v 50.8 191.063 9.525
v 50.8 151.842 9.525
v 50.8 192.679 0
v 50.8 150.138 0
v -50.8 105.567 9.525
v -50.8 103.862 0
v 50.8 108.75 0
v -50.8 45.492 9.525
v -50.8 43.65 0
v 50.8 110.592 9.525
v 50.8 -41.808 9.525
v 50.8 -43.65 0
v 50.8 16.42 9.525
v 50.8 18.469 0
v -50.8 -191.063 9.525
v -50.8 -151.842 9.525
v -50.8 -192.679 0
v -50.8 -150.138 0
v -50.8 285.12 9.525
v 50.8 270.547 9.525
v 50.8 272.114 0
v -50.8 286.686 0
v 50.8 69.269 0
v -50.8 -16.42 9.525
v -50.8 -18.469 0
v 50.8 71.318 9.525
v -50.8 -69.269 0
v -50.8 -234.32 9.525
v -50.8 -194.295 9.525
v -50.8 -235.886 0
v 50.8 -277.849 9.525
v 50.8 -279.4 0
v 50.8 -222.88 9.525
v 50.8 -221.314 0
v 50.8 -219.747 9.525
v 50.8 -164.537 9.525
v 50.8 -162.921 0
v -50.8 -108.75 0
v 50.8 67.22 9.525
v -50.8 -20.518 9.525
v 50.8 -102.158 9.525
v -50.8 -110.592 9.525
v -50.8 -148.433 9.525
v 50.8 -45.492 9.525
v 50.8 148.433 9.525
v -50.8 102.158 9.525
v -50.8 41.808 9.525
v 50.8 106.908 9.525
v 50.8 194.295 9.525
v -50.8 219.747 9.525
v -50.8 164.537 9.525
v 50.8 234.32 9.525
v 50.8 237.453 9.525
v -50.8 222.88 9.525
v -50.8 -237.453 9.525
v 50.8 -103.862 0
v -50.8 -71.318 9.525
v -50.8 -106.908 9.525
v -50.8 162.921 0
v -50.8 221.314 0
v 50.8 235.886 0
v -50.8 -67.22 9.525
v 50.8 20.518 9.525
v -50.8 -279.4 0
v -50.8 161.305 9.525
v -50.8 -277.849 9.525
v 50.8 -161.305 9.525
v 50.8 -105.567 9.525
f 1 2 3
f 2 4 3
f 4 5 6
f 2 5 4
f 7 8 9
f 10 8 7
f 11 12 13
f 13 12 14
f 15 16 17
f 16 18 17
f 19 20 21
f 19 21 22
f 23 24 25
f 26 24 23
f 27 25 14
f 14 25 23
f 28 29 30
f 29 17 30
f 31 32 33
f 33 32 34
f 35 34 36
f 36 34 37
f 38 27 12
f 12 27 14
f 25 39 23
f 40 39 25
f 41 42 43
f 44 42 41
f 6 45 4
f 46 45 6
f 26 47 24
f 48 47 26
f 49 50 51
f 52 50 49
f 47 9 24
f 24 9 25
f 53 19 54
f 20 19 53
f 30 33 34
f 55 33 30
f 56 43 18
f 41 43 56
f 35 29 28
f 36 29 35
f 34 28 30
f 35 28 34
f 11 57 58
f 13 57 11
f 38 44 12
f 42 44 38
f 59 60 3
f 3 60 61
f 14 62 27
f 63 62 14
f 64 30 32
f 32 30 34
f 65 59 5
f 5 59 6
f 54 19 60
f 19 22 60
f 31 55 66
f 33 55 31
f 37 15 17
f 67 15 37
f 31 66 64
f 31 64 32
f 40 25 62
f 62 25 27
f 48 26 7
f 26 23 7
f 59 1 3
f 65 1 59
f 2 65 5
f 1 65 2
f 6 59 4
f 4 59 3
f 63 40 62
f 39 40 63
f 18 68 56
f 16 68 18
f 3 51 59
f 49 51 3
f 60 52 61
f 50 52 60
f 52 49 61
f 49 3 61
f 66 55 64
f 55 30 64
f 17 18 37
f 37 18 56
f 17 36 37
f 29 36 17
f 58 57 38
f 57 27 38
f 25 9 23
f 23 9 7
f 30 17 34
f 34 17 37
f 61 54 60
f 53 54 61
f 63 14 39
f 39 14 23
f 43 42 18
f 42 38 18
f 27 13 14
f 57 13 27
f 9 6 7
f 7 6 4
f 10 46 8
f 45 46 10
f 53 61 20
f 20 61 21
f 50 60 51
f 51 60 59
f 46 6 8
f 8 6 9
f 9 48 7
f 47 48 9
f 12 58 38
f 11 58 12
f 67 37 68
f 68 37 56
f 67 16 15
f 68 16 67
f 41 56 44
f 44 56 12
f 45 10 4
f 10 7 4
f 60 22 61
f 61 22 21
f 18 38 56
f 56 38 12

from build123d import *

# Parameters (mm, degrees)
F2_DEPTH    = 9.525
F3_DEPTH    = 9.525
F4_DEPTH    = 9.525
F5_DEPTH    = 9.525
F6_DEPTH    = 9.525
F7_DEPTH    = 9.525
F8_DEPTH    = 9.525
F9_DEPTH    = 9.525
F10_DEPTH   = 9.525
F11_DEPTH   = 9.525
F12_DEPTH   = 9.525
F13_SIZE2   = 1.550911
F13_SIZE    = 9.52499
F13_2_SIZE2 = 1.550911
F13_2_SIZE  = 9.52499
F14_SIZE2   = 1.550911
F14_SIZE    = 9.52499
F14_2_SIZE2 = 1.550911
F14_2_SIZE  = 9.52499
F15_SIZE2   = 1.550911
F15_SIZE    = 9.52499
F15_2_SIZE2 = 1.550911
F15_2_SIZE  = 9.52499
F16_SIZE2   = 1.550911
F16_SIZE    = 9.52499
F16_2_SIZE2 = 1.550911
F16_2_SIZE  = 9.52499
F17_SIZE2   = 1.550911
F17_SIZE    = 9.52499
F17_2_SIZE2 = 1.550911
F17_2_SIZE  = 9.52499
F18_SIZE2   = 1.550911
F18_SIZE    = 9.52499
F18_2_SIZE2 = 1.550911
F18_2_SIZE  = 9.52499
F19_SIZE2   = 1.550911
F19_SIZE    = 9.52499
F19_2_SIZE2 = 1.550911
F19_2_SIZE  = 9.52499
F20_SIZE2   = 1.550911
F20_SIZE    = 9.52499
F20_2_SIZE2 = 1.550911
F20_2_SIZE  = 9.52499
F21_SIZE2   = 1.550911
F21_SIZE    = 9.52499
F21_2_SIZE2 = 1.550911
F21_2_SIZE  = 9.52499
F22_SIZE2   = 1.550911
F22_SIZE    = 9.52499
F22_2_SIZE2 = 1.550911
F22_2_SIZE  = 9.52499
F23_SIZE2   = 1.550911
F23_SIZE    = 9.52499
F23_2_SIZE2 = 1.550911
F23_2_SIZE  = 9.52499


# Not quite as in the source:
# - a fillet or chamfer is up to 0.001 mm smaller than in the source, because OpenCascade refuses the exact size


with BuildPart() as f2:
    # F1 (on Top) → F2 (new body)
    with BuildSketch(Plane.XY):
        Polygon((-50.8, 279.4), (-50.8, 221.3135439188), (50.8, 235.8864560812), (50.8, 272.1135439188), (-50.8, 286.6864560812), align=None)
    extrude(amount=F2_DEPTH)

    # F13 (size 9.525 and 1.5509205186 in the source; OpenCascade refuses exactly that, so slightly less here)
    f13_edges = [f2.edges().sort_by_distance(p)[0] for p in [
        (0, 228.6, 9.525),
    ]]
    f13_side = f2.faces().sort_by_distance((0, 228.6, 4.7625))[0]
    chamfer(f13_edges, length=F13_SIZE, length2=F13_SIZE2, reference=f13_side)

    # F13#2 (size 9.525 and 1.5509205186 in the source; OpenCascade refuses exactly that, so slightly less here)
    f13_2_edges = [f2.edges().sort_by_distance(p)[0] for p in [
        (0, 279.4, 9.525),
    ]]
    f13_2_side = f2.faces().sort_by_distance((0, 279.4, 4.7625))[0]
    chamfer(f13_2_edges, length=F13_2_SIZE, length2=F13_2_SIZE2, reference=f13_2_side)


with BuildPart() as f3:
    # F1 (on Top) → F3 (new body)
    with BuildSketch(Plane.XY):
        Polygon((-50.8, 221.3135439188), (-50.8, 162.9209762891), (50.8, 192.6790237109), (50.8, 235.8864560812), align=None)
    extrude(amount=F3_DEPTH)

    # F14 (size 9.525 and 1.5509205186 in the source; OpenCascade refuses exactly that, so slightly less here)
    f14_edges = [f3.edges().sort_by_distance(p)[0] for p in [
        (0, 228.6, 9.525),
    ]]
    f14_side = f3.faces().sort_by_distance((0, 228.6, 4.7625))[0]
    chamfer(f14_edges, length=F14_SIZE, length2=F14_SIZE2, reference=f14_side)

    # F14#2 (size 9.525 and 1.5509205186 in the source; OpenCascade refuses exactly that, so slightly less here)
    f14_2_edges = [f3.edges().sort_by_distance(p)[0] for p in [
        (0, 177.8, 9.525),
    ]]
    f14_2_side = f3.faces().sort_by_distance((0, 177.8, 4.7625))[0]
    chamfer(f14_2_edges, length=F14_2_SIZE, length2=F14_2_SIZE2, reference=f14_2_side)


with BuildPart() as f4:
    # F1 (on Top) → F4 (new body)
    with BuildSketch(Plane.XY):
        Polygon((-50.8, 162.9209762891), (-50.8, 103.8624894848), (50.8, 150.1375105152), (50.8, 192.6790237109), align=None)
    extrude(amount=F4_DEPTH)

    # F15 (size 9.525 and 1.5509205186 in the source; OpenCascade refuses exactly that, so slightly less here)
    f15_edges = [f4.edges().sort_by_distance(p)[0] for p in [
        (0, 177.8, 9.525),
    ]]
    f15_side = f4.faces().sort_by_distance((0, 177.8, 4.7625))[0]
    chamfer(f15_edges, length=F15_SIZE, length2=F15_SIZE2, reference=f15_side)

    # F15#2 (size 9.525 and 1.5509205186 in the source; OpenCascade refuses exactly that, so slightly less here)
    f15_2_edges = [f4.edges().sort_by_distance(p)[0] for p in [
        (0, 127, 9.525),
    ]]
    f15_2_side = f4.faces().sort_by_distance((0, 127, 4.7625))[0]
    chamfer(f15_2_edges, length=F15_2_SIZE, length2=F15_2_SIZE2, reference=f15_2_side)


with BuildPart() as f5:
    # F1 (on Top) → F5 (new body)
    with BuildSketch(Plane.XY):
        Polygon((-50.8, 103.8624894848), (-50.8, 43.64954709), (50.8, 108.75045291), (50.8, 150.1375105152), align=None)
    extrude(amount=F5_DEPTH)

    # F16 (size 9.525 and 1.5509205186 in the source; OpenCascade refuses exactly that, so slightly less here)
    f16_edges = [f5.edges().sort_by_distance(p)[0] for p in [
        (0, 127, 9.525),
    ]]
    f16_side = f5.faces().sort_by_distance((0, 127, 4.7625))[0]
    chamfer(f16_edges, length=F16_SIZE, length2=F16_SIZE2, reference=f16_side)

    # F16#2 (size 9.525 and 1.5509205186 in the source; OpenCascade refuses exactly that, so slightly less here)
    f16_2_edges = [f5.edges().sort_by_distance(p)[0] for p in [
        (0, 76.2, 9.525),
    ]]
    f16_2_side = f5.faces().sort_by_distance((0, 76.2, 4.7625))[0]
    chamfer(f16_2_edges, length=F16_2_SIZE, length2=F16_2_SIZE2, reference=f16_2_side)


with BuildPart() as f6:
    # F1 (on Top) → F6 (new body)
    with BuildSketch(Plane.XY):
        Polygon((-50.8, 43.64954709), (-50.8, -18.4687277608), (50.8, 69.2687277608), (50.8, 108.75045291), align=None)
    extrude(amount=F6_DEPTH)

    # F17 (size 9.525 and 1.5509205186 in the source; OpenCascade refuses exactly that, so slightly less here)
    f17_edges = [f6.edges().sort_by_distance(p)[0] for p in [
        (0, 25.4, 9.525),
    ]]
    f17_side = f6.faces().sort_by_distance((0, 25.4, 4.7625))[0]
    chamfer(f17_edges, length=F17_SIZE, length2=F17_SIZE2, reference=f17_side)

    # F17#2 (size 9.525 and 1.5509205186 in the source; OpenCascade refuses exactly that, so slightly less here)
    f17_2_edges = [f6.edges().sort_by_distance(p)[0] for p in [
        (0, 76.2, 9.525),
    ]]
    f17_2_side = f6.faces().sort_by_distance((0, 76.2, 4.7625))[0]
    chamfer(f17_2_edges, length=F17_2_SIZE, length2=F17_2_SIZE2, reference=f17_2_side)


with BuildPart() as f7:
    # F1 (on Top) → F7 (new body)
    with BuildSketch(Plane.XY):
        Polygon((-50.8, -18.4687277608), (-50.8, -69.2687277608), (50.8, 18.4687277608), (50.8, 69.2687277608), align=None)
    extrude(amount=F7_DEPTH)

    # F18 (size 9.525 and 1.5509205186 in the source; OpenCascade refuses exactly that, so slightly less here)
    f18_edges = [f7.edges().sort_by_distance(p)[0] for p in [
        (0, 25.4, 9.525),
    ]]
    f18_side = f7.faces().sort_by_distance((0, 25.4, 4.7625))[0]
    chamfer(f18_edges, length=F18_SIZE, length2=F18_SIZE2, reference=f18_side)

    # F18#2 (size 9.525 and 1.5509205186 in the source; OpenCascade refuses exactly that, so slightly less here)
    f18_2_edges = [f7.edges().sort_by_distance(p)[0] for p in [
        (0, -25.4, 9.525),
    ]]
    f18_2_side = f7.faces().sort_by_distance((0, -25.4, 4.7625))[0]
    chamfer(f18_2_edges, length=F18_2_SIZE, length2=F18_2_SIZE2, reference=f18_2_side)


with BuildPart() as f8:
    # F1 (on Top) → F8 (new body)
    with BuildSketch(Plane.XY):
        Polygon((-50.8, -69.2687277608), (-50.8, -108.75045291), (50.8, -43.64954709), (50.8, 18.4687277608), align=None)
    extrude(amount=F8_DEPTH)

    # F19 (size 9.525 and 1.5509205186 in the source; OpenCascade refuses exactly that, so slightly less here)
    f19_edges = [f8.edges().sort_by_distance(p)[0] for p in [
        (0, -25.4, 9.525),
    ]]
    f19_side = f8.faces().sort_by_distance((0, -25.4, 4.7625))[0]
    chamfer(f19_edges, length=F19_SIZE, length2=F19_SIZE2, reference=f19_side)

    # F19#2 (size 9.525 and 1.5509205186 in the source; OpenCascade refuses exactly that, so slightly less here)
    f19_2_edges = [f8.edges().sort_by_distance(p)[0] for p in [
        (0, -76.2, 9.525),
    ]]
    f19_2_side = f8.faces().sort_by_distance((0, -76.2, 4.7625))[0]
    chamfer(f19_2_edges, length=F19_2_SIZE, length2=F19_2_SIZE2, reference=f19_2_side)


with BuildPart() as f9:
    # F1 (on Top) → F9 (new body)
    with BuildSketch(Plane.XY):
        Polygon((-50.8, -108.75045291), (-50.8, -150.1375105152), (50.8, -103.8624894848), (50.8, -43.64954709), align=None)
    extrude(amount=F9_DEPTH)

    # F20 (size 9.525 and 1.5509205186 in the source; OpenCascade refuses exactly that, so slightly less here)
    f20_edges = [f9.edges().sort_by_distance(p)[0] for p in [
        (0, -76.2, 9.525),
    ]]
    f20_side = f9.faces().sort_by_distance((0, -76.2, 4.7625))[0]
    chamfer(f20_edges, length=F20_SIZE, length2=F20_SIZE2, reference=f20_side)

    # F20#2 (size 9.525 and 1.5509205186 in the source; OpenCascade refuses exactly that, so slightly less here)
    f20_2_edges = [f9.edges().sort_by_distance(p)[0] for p in [
        (0, -127, 9.525),
    ]]
    f20_2_side = f9.faces().sort_by_distance((0, -127, 4.7625))[0]
    chamfer(f20_2_edges, length=F20_2_SIZE, length2=F20_2_SIZE2, reference=f20_2_side)


with BuildPart() as f10:
    # F1 (on Top) → F10 (new body)
    with BuildSketch(Plane.XY):
        Polygon((-50.8, -150.1375105152), (-50.8, -192.6790237109), (50.8, -162.9209762891), (50.8, -103.8624894848), align=None)
    extrude(amount=F10_DEPTH)

    # F21 (size 9.525 and 1.5509205186 in the source; OpenCascade refuses exactly that, so slightly less here)
    f21_edges = [f10.edges().sort_by_distance(p)[0] for p in [
        (0, -127, 9.525),
    ]]
    f21_side = f10.faces().sort_by_distance((0, -127, 4.7625))[0]
    chamfer(f21_edges, length=F21_SIZE, length2=F21_SIZE2, reference=f21_side)

    # F21#2 (size 9.525 and 1.5509205186 in the source; OpenCascade refuses exactly that, so slightly less here)
    f21_2_edges = [f10.edges().sort_by_distance(p)[0] for p in [
        (0, -177.8, 9.525),
    ]]
    f21_2_side = f10.faces().sort_by_distance((0, -177.8, 4.7625))[0]
    chamfer(f21_2_edges, length=F21_2_SIZE, length2=F21_2_SIZE2, reference=f21_2_side)


with BuildPart() as f11:
    # F1 (on Top) → F11 (new body)
    with BuildSketch(Plane.XY):
        Polygon((-50.8, -192.6790237109), (-50.8, -235.8864560812), (50.8, -221.3135439188), (50.8, -162.9209762891), align=None)
    extrude(amount=F11_DEPTH)

    # F22 (size 9.525 and 1.5509205186 in the source; OpenCascade refuses exactly that, so slightly less here)
    f22_edges = [f11.edges().sort_by_distance(p)[0] for p in [
        (0, -177.8, 9.525),
    ]]
    f22_side = f11.faces().sort_by_distance((0, -177.8, 4.7625))[0]
    chamfer(f22_edges, length=F22_SIZE, length2=F22_SIZE2, reference=f22_side)

    # F22#2 (size 9.525 and 1.5509205186 in the source; OpenCascade refuses exactly that, so slightly less here)
    f22_2_edges = [f11.edges().sort_by_distance(p)[0] for p in [
        (0, -228.6, 9.525),
    ]]
    f22_2_side = f11.faces().sort_by_distance((0, -228.6, 4.7625))[0]
    chamfer(f22_2_edges, length=F22_2_SIZE, length2=F22_2_SIZE2, reference=f22_2_side)


with BuildPart() as f12:
    # F1 (on Top) → F12 (new body)
    with BuildSketch(Plane.XY):
        Polygon((-50.8, -235.8864560812), (-50.8, -279.4), (50.8, -279.4), (50.8, -221.3135439188), align=None)
    extrude(amount=F12_DEPTH)

    # F23 (size 9.525 and 1.5509205186 in the source; OpenCascade refuses exactly that, so slightly less here)
    f23_edges = [f12.edges().sort_by_distance(p)[0] for p in [
        (0, -228.6, 9.525),
    ]]
    f23_side = f12.faces().sort_by_distance((0, -228.6, 4.7625))[0]
    chamfer(f23_edges, length=F23_SIZE, length2=F23_SIZE2, reference=f23_side)

    # F23#2 (size 9.525 and 1.5509205186 in the source; OpenCascade refuses exactly that, so slightly less here)
    f23_2_edges = [f12.edges().sort_by_distance(p)[0] for p in [
        (0, -279.4, 9.525),
    ]]
    f23_2_side = f12.faces().sort_by_distance((0, -279.4, 4.7625))[0]
    chamfer(f23_2_edges, length=F23_2_SIZE, length2=F23_2_SIZE2, reference=f23_2_side)


solid = Compound([f2.part, f3.part, f4.part, f5.part, f6.part, f7.part, f8.part, f9.part, f10.part, f11.part, f12.part])
